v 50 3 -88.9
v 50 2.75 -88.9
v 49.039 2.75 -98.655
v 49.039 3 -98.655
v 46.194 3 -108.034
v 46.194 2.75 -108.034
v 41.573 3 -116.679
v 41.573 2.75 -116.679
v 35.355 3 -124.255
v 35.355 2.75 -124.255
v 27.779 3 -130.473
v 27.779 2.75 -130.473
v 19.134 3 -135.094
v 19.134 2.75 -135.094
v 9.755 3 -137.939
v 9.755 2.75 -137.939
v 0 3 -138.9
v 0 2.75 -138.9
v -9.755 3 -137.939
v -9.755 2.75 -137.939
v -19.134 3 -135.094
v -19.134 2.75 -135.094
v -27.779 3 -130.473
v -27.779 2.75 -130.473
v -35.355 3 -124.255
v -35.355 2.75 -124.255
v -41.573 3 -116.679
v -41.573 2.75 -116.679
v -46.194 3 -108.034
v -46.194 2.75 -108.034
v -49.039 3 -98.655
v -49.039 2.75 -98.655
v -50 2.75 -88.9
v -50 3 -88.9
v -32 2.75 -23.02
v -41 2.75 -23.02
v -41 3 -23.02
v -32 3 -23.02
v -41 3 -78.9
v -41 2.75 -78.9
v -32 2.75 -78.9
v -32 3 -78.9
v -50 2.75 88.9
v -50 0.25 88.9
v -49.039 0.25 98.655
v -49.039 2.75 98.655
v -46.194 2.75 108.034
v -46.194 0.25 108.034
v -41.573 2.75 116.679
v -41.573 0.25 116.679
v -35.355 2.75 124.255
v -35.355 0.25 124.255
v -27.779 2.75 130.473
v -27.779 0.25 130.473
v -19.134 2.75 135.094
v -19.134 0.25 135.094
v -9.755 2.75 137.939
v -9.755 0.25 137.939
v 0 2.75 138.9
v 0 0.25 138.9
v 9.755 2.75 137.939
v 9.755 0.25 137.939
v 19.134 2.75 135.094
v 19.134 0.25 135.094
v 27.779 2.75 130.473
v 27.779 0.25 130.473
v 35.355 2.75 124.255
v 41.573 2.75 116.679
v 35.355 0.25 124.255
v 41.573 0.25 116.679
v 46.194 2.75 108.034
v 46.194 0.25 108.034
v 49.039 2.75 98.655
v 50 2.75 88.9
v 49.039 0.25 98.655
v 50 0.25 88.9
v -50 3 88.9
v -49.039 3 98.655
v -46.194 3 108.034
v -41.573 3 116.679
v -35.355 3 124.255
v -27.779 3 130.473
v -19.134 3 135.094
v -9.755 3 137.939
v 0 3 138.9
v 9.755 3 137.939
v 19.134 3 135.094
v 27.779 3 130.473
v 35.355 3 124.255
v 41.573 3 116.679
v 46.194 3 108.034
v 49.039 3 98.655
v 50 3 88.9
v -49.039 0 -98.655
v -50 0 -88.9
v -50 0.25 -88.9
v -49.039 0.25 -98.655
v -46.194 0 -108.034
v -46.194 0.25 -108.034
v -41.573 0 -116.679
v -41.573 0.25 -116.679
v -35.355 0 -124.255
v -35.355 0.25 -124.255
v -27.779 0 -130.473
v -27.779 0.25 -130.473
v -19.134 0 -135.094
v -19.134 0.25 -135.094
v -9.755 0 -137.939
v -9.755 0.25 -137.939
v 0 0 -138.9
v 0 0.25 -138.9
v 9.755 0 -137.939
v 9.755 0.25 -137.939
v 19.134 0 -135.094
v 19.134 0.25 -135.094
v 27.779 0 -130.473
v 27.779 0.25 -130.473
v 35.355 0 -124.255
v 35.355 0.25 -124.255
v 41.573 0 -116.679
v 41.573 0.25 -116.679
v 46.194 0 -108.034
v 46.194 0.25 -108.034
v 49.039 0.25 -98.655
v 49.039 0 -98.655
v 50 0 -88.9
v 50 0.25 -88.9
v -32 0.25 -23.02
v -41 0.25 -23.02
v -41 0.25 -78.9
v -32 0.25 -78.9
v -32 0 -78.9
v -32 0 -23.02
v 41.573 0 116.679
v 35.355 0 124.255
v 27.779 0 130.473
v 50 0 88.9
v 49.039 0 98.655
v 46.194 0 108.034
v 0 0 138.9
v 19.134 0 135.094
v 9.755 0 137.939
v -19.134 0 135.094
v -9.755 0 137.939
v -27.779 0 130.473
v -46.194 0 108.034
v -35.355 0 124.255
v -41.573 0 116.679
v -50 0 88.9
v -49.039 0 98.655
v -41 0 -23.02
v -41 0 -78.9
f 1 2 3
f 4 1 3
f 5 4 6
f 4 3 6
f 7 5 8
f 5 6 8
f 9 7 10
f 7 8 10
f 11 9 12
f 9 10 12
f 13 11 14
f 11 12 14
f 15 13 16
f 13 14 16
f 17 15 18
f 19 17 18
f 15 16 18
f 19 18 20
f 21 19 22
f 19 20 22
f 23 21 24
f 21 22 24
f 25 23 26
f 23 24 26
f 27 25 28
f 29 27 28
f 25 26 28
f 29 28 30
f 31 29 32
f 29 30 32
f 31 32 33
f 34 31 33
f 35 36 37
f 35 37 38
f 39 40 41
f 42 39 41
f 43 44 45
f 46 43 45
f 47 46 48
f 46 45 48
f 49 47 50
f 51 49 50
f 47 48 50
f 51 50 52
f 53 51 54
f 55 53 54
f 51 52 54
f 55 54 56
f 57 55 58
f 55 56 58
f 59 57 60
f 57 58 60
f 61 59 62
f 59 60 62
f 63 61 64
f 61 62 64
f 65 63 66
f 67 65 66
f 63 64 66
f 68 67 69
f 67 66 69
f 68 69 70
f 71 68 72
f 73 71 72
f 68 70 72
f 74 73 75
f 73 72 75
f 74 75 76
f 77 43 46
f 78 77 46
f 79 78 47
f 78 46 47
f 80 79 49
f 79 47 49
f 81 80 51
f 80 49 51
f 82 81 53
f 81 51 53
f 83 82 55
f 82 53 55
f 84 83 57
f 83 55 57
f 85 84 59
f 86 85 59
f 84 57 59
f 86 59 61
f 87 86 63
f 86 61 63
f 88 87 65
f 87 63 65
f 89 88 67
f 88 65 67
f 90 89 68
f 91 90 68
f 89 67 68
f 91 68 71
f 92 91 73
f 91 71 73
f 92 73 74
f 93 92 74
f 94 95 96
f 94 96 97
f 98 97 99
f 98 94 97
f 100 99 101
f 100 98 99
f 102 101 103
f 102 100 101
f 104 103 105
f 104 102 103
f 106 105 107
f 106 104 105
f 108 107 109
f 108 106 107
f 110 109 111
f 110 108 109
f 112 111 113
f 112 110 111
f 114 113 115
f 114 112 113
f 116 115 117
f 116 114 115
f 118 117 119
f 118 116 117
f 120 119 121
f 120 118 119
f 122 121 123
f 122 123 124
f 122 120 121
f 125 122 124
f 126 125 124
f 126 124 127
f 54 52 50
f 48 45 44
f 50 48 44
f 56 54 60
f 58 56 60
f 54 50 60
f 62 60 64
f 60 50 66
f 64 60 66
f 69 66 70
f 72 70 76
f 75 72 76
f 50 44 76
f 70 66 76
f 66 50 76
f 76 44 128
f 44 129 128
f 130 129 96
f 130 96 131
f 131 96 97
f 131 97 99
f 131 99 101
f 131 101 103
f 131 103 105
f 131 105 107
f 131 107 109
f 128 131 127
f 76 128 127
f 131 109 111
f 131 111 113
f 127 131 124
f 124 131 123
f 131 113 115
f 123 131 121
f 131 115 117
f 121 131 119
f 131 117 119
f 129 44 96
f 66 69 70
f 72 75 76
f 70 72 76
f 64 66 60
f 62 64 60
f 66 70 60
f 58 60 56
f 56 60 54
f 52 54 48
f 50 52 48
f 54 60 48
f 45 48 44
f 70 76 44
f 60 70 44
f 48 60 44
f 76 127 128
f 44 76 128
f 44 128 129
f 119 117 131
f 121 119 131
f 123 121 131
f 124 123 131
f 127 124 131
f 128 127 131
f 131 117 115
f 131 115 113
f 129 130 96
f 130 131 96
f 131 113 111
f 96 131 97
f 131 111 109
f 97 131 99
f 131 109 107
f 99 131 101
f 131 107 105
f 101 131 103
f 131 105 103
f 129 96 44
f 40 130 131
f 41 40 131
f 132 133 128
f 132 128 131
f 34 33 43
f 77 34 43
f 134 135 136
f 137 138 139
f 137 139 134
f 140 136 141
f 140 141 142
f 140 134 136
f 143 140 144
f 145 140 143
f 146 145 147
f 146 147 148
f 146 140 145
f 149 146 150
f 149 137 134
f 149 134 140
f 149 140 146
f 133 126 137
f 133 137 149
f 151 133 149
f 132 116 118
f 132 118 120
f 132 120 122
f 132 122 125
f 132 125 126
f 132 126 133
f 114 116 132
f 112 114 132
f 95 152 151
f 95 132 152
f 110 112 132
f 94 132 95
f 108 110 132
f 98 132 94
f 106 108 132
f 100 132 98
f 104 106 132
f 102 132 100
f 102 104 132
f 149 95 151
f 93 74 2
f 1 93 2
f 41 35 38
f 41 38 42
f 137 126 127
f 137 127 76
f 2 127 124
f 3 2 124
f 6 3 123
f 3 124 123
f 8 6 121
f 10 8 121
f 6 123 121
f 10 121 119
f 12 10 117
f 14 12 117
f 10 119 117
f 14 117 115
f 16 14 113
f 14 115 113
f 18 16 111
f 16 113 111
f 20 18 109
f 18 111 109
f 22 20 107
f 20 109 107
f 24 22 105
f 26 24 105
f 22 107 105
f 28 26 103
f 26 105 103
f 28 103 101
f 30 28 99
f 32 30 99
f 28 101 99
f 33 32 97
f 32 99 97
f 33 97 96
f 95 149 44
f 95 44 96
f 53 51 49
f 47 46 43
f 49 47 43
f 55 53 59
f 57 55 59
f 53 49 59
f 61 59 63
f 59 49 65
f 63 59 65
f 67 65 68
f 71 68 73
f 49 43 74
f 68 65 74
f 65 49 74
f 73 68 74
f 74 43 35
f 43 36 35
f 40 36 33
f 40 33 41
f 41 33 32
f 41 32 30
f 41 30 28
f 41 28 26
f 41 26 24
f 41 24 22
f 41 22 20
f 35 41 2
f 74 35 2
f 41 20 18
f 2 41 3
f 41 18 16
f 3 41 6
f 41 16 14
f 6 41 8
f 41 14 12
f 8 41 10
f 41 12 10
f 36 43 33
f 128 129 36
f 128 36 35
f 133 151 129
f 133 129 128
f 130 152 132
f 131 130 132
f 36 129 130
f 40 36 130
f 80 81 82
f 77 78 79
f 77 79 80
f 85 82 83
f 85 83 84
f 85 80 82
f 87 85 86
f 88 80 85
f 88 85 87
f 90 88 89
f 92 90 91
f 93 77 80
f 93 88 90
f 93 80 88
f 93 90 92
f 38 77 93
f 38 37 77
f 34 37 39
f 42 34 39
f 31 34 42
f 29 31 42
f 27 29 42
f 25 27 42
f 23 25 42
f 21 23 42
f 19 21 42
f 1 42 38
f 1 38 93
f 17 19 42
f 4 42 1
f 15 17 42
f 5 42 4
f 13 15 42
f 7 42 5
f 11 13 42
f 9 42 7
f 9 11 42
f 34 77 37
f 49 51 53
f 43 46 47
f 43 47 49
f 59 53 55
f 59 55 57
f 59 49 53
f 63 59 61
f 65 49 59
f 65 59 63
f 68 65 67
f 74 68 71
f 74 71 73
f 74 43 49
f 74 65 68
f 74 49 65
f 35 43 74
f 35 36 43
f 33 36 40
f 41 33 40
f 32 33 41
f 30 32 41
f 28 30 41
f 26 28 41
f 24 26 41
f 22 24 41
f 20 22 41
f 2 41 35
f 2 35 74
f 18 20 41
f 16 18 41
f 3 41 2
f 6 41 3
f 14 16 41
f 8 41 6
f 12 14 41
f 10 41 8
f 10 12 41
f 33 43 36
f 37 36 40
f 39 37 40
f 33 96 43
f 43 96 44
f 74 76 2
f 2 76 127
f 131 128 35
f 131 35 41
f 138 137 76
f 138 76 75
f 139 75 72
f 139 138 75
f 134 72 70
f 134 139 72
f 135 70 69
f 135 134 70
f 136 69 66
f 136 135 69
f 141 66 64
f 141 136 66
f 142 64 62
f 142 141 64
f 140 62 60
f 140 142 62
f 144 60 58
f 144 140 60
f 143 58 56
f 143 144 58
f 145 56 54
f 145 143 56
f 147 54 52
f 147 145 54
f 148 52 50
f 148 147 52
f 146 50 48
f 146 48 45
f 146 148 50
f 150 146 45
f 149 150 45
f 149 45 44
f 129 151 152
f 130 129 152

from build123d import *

# Parameters (mm, degrees)
SKETCH1_W           = 9
SKETCH1_H           = 55.88
BOSS_EXTRUDE1_DEPTH = 0.25
SKETCH2_W           = 9
SKETCH2_H           = 55.88
BOSS_EXTRUDE3_DEPTH = 2.5
SKETCH3_W           = 9
SKETCH3_H           = 55.88
BOSS_EXTRUDE4_DEPTH = 0.25


with BuildPart() as part:
    # Sketch1 → Boss-Extrude1 (new body)
    with BuildSketch(Plane(origin=(0, 0, 0), x_dir=(1, 0, 0), z_dir=(0, 1, 0))):
        with BuildLine():
            Line((50, 88.9), (50, -88.9))
            ThreePointArc((50, -88.9), (0, -138.9), (-50, -88.9))
            Line((-50, -88.9), (-50, 88.9))
            ThreePointArc((-50, 88.9), (0, 138.9), (50, 88.9))
        make_face()
        with Locations((-36.5, 50.96)):
            Rectangle(SKETCH1_W, SKETCH1_H, mode=Mode.SUBTRACT)
    extrude(amount=BOSS_EXTRUDE1_DEPTH)


with BuildPart() as body_2:
    # Sketch2 → Boss-Extrude3 (new body)
    with BuildSketch(Plane(origin=(0, 0.25, 0), x_dir=(1, 0, 0), z_dir=(0, 1, 0))):
        with BuildLine():
            ThreePointArc((50, 88.9), (0, 138.9), (-50, 88.9))
            Line((-50, 88.9), (-50, -88.9))
            ThreePointArc((-50, -88.9), (0, -138.9), (50, -88.9))
            Line((50, -88.9), (50, 88.9))
        make_face()
        with Locations((-36.5, 50.96)):
            Rectangle(SKETCH2_W, SKETCH2_H, mode=Mode.SUBTRACT)
    extrude(amount=BOSS_EXTRUDE3_DEPTH)


with BuildPart() as body_3:
    # Sketch3 → Boss-Extrude4 (new body)
    with BuildSketch(Plane(origin=(0, 2.75, 0), x_dir=(1, 0, 0), z_dir=(0, 1, 0))):
        with BuildLine():
            ThreePointArc((-50, -88.9), (0, -138.9), (50, -88.9))
            Line((50, -88.9), (50, 88.9))
            ThreePointArc((50, 88.9), (0, 138.9), (-50, 88.9))
            Line((-50, 88.9), (-50, -88.9))
        make_face()
        with Locations((-36.5, 50.96)):
            Rectangle(SKETCH3_W, SKETCH3_H, mode=Mode.SUBTRACT)
    extrude(amount=BOSS_EXTRUDE4_DEPTH)


solid = Compound([part.part, body_2.part, body_3.part])
